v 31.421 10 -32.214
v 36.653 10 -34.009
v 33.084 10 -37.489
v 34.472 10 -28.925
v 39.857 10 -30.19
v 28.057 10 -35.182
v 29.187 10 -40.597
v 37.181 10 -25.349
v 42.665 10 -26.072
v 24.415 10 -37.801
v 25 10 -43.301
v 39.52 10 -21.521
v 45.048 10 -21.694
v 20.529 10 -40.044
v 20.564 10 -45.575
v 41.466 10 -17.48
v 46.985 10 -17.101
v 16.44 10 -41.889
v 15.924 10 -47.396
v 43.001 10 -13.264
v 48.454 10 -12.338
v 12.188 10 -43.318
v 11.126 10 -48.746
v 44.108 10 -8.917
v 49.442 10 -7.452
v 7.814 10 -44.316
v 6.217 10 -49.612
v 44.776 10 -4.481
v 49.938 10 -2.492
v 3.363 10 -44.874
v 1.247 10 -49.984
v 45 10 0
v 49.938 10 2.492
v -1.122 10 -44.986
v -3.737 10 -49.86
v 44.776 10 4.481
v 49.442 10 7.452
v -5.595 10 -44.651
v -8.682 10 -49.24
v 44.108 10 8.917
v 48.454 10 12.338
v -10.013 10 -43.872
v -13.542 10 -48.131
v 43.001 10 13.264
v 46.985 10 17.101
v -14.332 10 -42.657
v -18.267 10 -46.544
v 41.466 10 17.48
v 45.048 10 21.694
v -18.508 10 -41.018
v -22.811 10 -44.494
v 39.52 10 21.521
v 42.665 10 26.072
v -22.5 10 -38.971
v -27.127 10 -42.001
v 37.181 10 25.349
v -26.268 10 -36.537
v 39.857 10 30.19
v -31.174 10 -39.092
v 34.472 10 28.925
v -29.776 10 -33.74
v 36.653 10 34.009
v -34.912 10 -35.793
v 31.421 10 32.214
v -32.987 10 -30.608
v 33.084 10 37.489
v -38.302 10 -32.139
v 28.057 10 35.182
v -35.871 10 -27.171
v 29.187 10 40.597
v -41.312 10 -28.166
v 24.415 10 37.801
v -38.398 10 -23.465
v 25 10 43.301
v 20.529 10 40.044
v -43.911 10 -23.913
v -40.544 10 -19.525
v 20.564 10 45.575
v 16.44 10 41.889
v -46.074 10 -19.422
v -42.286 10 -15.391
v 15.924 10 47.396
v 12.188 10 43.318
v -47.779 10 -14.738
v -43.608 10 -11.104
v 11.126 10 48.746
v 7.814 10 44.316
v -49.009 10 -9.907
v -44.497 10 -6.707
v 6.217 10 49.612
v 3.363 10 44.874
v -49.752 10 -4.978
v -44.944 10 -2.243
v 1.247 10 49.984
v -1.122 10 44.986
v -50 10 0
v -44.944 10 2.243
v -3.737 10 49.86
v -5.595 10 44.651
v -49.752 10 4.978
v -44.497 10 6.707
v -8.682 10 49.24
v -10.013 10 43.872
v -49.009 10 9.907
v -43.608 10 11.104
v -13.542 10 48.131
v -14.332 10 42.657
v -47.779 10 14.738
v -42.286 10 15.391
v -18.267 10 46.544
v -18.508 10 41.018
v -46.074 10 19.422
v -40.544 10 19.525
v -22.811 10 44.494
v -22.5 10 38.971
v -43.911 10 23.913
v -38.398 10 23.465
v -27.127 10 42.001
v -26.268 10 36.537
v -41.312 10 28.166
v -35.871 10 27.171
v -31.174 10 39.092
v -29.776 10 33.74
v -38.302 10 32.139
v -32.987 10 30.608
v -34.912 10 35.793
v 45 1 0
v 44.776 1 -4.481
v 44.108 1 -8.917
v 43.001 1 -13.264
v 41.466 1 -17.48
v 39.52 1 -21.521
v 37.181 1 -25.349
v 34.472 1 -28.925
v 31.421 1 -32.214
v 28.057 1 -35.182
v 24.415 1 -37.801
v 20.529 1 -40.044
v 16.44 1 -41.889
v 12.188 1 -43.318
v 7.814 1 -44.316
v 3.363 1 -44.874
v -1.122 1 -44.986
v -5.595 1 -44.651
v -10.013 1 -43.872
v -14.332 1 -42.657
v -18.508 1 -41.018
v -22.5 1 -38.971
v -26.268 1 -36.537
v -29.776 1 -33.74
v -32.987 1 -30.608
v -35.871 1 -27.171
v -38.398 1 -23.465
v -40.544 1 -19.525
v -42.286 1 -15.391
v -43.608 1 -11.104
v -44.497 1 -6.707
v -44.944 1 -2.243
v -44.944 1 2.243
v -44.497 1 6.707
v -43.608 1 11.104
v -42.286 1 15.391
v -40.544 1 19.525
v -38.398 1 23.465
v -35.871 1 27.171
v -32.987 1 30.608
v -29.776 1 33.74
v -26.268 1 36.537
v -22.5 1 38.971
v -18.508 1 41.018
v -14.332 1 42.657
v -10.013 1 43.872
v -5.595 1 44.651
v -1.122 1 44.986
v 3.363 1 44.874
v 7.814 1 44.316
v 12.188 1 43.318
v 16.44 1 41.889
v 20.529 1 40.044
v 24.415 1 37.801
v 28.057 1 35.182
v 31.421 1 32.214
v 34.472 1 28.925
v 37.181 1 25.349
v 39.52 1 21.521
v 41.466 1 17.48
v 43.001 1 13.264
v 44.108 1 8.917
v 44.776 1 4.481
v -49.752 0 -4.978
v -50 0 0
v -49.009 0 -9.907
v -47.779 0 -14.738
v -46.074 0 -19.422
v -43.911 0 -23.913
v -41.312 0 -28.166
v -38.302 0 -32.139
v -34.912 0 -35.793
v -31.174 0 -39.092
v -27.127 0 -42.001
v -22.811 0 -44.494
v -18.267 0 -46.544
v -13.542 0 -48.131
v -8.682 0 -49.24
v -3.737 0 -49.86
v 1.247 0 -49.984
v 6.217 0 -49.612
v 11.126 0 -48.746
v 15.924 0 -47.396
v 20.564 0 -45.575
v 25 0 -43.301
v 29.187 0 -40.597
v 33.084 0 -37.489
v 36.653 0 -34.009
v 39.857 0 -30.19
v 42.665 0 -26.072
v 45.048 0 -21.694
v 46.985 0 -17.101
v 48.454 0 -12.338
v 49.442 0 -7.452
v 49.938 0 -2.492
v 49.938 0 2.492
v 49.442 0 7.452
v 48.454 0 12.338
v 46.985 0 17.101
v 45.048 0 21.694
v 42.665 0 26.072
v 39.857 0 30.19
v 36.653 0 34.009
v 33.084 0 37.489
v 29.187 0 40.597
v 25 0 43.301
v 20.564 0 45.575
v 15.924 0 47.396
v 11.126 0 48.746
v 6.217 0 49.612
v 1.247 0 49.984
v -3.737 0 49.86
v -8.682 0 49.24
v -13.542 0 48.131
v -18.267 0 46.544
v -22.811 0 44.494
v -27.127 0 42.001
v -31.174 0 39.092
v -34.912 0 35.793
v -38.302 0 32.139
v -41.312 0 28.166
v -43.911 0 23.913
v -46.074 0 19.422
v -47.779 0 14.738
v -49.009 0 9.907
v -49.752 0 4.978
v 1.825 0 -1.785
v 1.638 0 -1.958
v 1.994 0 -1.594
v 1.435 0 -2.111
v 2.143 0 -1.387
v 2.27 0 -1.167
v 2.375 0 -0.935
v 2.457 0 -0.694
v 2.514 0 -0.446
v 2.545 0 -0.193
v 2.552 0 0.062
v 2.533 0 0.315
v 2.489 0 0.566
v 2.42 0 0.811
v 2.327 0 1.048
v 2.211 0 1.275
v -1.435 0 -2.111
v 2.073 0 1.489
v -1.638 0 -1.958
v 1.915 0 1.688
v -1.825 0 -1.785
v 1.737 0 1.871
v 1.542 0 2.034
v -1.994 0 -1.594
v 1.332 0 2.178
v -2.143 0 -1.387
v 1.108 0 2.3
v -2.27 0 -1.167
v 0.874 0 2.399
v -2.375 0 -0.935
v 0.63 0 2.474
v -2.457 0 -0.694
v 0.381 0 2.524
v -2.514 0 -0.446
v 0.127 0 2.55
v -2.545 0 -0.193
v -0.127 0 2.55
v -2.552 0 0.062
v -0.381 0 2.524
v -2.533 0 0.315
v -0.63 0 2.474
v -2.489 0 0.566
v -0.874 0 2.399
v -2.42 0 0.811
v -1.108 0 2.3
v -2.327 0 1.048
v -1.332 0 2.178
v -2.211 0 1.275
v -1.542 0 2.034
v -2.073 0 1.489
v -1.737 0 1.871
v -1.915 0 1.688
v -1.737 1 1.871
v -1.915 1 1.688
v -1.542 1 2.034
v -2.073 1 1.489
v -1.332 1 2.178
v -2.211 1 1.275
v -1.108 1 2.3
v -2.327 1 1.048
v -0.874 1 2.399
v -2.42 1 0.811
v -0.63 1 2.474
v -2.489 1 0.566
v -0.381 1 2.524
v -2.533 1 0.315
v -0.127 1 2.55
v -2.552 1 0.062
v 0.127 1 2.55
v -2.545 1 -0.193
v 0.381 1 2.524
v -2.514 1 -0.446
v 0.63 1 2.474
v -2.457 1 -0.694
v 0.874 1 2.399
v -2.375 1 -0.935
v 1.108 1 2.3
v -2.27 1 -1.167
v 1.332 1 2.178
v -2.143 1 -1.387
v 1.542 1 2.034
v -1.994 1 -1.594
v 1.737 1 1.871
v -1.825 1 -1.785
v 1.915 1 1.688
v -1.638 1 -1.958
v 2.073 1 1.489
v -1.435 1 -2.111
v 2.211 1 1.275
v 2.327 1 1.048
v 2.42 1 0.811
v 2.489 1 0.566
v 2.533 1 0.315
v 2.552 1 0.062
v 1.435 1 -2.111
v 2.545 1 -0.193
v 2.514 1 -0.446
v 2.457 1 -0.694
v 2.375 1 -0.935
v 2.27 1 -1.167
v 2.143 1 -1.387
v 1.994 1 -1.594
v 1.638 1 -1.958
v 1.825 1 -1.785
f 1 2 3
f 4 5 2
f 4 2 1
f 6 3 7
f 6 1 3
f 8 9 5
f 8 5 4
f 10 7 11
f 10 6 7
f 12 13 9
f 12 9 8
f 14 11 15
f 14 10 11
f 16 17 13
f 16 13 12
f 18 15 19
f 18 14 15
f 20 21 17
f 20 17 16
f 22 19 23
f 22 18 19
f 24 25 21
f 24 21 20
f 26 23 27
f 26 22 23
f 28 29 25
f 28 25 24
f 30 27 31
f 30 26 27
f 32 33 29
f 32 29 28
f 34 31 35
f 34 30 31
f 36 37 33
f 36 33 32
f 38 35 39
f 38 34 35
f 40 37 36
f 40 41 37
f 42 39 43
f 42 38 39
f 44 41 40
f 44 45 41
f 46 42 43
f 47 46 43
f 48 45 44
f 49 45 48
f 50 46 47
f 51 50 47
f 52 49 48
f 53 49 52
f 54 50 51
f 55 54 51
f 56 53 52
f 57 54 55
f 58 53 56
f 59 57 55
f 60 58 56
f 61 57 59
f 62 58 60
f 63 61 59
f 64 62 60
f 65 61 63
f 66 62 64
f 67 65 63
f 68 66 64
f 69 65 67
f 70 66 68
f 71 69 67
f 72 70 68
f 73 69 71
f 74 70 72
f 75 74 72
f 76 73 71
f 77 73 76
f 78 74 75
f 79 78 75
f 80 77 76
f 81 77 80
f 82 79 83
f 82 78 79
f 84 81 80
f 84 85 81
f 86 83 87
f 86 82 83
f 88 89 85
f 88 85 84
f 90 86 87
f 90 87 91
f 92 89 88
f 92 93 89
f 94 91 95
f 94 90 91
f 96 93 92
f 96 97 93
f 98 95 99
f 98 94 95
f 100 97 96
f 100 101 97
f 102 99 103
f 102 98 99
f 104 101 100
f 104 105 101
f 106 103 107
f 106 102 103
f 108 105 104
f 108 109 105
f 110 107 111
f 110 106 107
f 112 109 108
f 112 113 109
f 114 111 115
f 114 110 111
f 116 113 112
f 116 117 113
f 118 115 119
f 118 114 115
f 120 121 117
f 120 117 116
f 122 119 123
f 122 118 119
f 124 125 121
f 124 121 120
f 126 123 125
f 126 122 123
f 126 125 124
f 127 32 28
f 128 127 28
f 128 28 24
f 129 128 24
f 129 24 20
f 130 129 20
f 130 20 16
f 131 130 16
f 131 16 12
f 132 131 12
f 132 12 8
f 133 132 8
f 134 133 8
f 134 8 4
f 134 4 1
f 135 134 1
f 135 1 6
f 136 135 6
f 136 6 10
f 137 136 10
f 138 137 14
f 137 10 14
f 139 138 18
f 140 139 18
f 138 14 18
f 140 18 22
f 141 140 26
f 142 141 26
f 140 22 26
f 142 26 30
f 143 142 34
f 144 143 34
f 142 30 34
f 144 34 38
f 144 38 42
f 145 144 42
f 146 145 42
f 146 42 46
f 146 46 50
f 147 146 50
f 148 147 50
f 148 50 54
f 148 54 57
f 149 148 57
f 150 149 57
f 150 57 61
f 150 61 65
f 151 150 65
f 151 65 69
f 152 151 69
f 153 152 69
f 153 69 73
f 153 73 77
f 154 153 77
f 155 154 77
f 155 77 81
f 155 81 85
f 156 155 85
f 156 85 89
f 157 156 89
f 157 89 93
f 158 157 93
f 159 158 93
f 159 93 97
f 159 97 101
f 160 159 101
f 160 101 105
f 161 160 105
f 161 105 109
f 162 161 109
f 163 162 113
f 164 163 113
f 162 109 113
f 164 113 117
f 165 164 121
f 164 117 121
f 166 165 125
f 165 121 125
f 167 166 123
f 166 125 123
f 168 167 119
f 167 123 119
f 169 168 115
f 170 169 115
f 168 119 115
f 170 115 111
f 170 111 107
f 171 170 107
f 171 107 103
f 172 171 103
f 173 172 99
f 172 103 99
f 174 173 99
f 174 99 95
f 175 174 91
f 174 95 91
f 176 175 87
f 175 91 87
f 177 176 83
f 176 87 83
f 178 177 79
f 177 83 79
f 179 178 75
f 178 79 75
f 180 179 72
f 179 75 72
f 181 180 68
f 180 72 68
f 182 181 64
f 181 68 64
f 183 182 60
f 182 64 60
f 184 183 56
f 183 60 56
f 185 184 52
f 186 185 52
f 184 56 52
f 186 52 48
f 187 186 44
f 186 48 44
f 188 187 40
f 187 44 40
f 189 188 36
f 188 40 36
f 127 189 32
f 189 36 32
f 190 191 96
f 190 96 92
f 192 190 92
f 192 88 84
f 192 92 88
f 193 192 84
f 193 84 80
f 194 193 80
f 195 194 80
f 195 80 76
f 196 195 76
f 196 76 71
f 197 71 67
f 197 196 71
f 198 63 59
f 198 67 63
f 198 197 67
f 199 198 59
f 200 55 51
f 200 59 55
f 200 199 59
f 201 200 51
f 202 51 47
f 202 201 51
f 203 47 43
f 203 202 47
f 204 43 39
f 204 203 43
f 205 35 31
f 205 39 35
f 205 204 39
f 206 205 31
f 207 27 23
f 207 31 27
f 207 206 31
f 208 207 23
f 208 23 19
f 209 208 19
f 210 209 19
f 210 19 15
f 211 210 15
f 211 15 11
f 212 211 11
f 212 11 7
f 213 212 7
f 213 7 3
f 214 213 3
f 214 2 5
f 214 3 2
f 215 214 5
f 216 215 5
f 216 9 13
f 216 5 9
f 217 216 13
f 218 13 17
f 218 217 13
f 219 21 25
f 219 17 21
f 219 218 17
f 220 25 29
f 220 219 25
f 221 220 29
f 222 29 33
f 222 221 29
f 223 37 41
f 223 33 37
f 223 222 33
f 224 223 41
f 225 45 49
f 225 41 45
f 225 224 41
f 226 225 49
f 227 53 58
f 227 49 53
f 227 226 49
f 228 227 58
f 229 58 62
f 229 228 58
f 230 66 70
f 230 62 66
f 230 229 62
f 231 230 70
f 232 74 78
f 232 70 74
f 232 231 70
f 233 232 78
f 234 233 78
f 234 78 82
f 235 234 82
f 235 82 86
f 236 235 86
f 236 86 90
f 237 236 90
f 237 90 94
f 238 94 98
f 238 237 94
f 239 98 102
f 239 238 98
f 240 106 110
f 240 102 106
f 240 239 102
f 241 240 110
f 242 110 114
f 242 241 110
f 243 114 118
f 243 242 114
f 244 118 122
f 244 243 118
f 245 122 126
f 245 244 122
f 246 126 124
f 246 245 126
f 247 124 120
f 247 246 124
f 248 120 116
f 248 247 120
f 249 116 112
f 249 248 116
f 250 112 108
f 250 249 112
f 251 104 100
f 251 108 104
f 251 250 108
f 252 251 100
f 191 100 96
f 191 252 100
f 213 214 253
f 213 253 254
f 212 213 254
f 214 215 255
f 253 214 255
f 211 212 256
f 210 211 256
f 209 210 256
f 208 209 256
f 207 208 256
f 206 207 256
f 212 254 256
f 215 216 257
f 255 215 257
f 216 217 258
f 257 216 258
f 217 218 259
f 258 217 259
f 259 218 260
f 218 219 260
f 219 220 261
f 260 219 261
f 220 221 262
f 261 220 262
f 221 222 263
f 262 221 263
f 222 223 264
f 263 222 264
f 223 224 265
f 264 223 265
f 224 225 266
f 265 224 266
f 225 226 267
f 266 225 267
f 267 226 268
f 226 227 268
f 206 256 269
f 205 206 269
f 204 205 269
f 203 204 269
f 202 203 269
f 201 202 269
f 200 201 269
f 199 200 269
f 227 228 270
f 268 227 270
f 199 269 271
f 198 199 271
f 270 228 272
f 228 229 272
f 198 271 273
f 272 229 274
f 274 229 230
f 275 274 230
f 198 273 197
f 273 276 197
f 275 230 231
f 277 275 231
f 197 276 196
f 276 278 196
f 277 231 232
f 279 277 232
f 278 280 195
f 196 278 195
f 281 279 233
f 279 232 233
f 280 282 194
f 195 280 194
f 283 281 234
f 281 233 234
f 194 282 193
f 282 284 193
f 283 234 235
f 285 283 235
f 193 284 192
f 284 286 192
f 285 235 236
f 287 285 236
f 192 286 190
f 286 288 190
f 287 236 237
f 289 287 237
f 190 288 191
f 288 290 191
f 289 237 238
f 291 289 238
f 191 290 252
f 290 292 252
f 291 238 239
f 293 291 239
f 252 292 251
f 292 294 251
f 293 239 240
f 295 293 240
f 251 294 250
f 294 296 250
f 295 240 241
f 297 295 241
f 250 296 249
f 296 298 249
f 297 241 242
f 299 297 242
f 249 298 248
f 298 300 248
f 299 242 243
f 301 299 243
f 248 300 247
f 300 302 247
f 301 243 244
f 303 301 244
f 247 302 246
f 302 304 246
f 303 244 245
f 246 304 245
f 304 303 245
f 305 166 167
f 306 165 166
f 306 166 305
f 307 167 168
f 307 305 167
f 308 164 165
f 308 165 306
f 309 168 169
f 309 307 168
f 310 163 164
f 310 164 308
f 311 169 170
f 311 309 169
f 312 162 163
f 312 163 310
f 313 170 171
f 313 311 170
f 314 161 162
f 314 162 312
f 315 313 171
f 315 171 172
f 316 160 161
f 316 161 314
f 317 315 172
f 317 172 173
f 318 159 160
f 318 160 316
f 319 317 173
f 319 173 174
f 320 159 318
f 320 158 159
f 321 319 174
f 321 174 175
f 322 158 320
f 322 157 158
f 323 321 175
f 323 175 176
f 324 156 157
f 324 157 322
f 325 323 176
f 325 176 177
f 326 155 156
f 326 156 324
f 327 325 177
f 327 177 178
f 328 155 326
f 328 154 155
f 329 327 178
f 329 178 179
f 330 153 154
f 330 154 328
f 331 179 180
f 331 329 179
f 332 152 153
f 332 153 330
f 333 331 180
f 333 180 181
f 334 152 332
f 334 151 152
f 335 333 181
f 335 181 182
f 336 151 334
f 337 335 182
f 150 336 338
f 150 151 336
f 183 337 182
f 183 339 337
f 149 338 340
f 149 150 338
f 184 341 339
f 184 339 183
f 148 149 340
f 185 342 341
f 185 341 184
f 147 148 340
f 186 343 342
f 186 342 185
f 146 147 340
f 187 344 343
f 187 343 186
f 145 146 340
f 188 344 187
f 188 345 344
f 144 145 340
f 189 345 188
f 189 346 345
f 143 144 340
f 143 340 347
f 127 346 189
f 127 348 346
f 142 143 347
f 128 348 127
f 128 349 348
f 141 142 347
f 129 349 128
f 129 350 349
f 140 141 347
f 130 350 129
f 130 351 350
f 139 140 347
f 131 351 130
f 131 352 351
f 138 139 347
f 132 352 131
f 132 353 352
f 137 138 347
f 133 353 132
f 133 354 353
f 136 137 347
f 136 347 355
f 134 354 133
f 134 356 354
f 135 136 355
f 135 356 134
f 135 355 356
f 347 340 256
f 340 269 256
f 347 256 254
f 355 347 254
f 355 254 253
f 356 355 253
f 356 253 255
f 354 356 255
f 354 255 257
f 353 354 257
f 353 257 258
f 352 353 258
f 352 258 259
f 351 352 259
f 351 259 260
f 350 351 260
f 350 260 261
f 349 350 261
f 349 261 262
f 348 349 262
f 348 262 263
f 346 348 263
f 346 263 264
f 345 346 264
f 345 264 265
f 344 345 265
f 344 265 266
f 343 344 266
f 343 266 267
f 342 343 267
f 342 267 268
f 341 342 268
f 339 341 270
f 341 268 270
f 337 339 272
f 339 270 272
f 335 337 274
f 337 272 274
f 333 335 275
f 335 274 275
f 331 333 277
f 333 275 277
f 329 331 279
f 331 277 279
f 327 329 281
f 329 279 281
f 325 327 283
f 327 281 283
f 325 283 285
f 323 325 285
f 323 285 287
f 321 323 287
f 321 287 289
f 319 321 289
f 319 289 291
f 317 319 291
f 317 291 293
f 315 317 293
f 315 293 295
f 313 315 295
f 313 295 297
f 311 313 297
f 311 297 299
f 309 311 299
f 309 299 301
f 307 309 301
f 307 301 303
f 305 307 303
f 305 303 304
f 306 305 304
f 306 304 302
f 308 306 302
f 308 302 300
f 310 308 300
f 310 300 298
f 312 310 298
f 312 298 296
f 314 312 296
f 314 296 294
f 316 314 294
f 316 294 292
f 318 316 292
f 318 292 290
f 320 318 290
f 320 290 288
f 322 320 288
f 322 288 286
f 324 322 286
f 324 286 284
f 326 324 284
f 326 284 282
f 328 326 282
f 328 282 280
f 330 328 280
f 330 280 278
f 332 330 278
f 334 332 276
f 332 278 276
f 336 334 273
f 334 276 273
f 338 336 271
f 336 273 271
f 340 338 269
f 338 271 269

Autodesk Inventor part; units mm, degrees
ref_plane "YZ Plane" through (0, 0, 0) normal (1, 0, 0) x (0, 1, 0)
ref_plane "XZ Plane" through (0, 0, 0) normal (0, 1, 0) x (-1, 0, 0)
ref_plane "XY Plane" through (0, 0, 0) normal (0, 0, 1) x (1, 0, 0)
sketch "Sketch1" plane through (0, 0, 0) normal (0, 1, 0) x (-1, 0, 0)
  circle A0 centre (0, 0) radius 50
  circle A1 centre (0, 0) radius 2.5527
  line L0 (1.4351, -2.1111) -> (-1.4351, -2.1111)
  dimension "d0" = 100
  dimension "d1" = 5.1054
  dimension "d2" = 2.8702
extrude "Extrusion1" add sketch "Sketch1" along normal blind 10 contours A0 | L0 A1 picked at (0.2983, -2.2043)
sketch "Sketch2" plane through (0, 10, 0) normal (0, 1, 0) x (1, 0, 0)
  circle A0 centre (0, 0) radius 45
  dimension "d5" = 90
extrude "Extrusion2" cut sketch "Sketch2" against normal blind 9
sketch "Sketch7" plane through (0, 1, 0) normal (0, 1, 0) x (1, 0, 0)
  circle A0 centre (0, 0) radius 45
extrude "Extrusion5" cut sketch "Sketch7" along normal blind 10
properties part number "Gearsp1"
